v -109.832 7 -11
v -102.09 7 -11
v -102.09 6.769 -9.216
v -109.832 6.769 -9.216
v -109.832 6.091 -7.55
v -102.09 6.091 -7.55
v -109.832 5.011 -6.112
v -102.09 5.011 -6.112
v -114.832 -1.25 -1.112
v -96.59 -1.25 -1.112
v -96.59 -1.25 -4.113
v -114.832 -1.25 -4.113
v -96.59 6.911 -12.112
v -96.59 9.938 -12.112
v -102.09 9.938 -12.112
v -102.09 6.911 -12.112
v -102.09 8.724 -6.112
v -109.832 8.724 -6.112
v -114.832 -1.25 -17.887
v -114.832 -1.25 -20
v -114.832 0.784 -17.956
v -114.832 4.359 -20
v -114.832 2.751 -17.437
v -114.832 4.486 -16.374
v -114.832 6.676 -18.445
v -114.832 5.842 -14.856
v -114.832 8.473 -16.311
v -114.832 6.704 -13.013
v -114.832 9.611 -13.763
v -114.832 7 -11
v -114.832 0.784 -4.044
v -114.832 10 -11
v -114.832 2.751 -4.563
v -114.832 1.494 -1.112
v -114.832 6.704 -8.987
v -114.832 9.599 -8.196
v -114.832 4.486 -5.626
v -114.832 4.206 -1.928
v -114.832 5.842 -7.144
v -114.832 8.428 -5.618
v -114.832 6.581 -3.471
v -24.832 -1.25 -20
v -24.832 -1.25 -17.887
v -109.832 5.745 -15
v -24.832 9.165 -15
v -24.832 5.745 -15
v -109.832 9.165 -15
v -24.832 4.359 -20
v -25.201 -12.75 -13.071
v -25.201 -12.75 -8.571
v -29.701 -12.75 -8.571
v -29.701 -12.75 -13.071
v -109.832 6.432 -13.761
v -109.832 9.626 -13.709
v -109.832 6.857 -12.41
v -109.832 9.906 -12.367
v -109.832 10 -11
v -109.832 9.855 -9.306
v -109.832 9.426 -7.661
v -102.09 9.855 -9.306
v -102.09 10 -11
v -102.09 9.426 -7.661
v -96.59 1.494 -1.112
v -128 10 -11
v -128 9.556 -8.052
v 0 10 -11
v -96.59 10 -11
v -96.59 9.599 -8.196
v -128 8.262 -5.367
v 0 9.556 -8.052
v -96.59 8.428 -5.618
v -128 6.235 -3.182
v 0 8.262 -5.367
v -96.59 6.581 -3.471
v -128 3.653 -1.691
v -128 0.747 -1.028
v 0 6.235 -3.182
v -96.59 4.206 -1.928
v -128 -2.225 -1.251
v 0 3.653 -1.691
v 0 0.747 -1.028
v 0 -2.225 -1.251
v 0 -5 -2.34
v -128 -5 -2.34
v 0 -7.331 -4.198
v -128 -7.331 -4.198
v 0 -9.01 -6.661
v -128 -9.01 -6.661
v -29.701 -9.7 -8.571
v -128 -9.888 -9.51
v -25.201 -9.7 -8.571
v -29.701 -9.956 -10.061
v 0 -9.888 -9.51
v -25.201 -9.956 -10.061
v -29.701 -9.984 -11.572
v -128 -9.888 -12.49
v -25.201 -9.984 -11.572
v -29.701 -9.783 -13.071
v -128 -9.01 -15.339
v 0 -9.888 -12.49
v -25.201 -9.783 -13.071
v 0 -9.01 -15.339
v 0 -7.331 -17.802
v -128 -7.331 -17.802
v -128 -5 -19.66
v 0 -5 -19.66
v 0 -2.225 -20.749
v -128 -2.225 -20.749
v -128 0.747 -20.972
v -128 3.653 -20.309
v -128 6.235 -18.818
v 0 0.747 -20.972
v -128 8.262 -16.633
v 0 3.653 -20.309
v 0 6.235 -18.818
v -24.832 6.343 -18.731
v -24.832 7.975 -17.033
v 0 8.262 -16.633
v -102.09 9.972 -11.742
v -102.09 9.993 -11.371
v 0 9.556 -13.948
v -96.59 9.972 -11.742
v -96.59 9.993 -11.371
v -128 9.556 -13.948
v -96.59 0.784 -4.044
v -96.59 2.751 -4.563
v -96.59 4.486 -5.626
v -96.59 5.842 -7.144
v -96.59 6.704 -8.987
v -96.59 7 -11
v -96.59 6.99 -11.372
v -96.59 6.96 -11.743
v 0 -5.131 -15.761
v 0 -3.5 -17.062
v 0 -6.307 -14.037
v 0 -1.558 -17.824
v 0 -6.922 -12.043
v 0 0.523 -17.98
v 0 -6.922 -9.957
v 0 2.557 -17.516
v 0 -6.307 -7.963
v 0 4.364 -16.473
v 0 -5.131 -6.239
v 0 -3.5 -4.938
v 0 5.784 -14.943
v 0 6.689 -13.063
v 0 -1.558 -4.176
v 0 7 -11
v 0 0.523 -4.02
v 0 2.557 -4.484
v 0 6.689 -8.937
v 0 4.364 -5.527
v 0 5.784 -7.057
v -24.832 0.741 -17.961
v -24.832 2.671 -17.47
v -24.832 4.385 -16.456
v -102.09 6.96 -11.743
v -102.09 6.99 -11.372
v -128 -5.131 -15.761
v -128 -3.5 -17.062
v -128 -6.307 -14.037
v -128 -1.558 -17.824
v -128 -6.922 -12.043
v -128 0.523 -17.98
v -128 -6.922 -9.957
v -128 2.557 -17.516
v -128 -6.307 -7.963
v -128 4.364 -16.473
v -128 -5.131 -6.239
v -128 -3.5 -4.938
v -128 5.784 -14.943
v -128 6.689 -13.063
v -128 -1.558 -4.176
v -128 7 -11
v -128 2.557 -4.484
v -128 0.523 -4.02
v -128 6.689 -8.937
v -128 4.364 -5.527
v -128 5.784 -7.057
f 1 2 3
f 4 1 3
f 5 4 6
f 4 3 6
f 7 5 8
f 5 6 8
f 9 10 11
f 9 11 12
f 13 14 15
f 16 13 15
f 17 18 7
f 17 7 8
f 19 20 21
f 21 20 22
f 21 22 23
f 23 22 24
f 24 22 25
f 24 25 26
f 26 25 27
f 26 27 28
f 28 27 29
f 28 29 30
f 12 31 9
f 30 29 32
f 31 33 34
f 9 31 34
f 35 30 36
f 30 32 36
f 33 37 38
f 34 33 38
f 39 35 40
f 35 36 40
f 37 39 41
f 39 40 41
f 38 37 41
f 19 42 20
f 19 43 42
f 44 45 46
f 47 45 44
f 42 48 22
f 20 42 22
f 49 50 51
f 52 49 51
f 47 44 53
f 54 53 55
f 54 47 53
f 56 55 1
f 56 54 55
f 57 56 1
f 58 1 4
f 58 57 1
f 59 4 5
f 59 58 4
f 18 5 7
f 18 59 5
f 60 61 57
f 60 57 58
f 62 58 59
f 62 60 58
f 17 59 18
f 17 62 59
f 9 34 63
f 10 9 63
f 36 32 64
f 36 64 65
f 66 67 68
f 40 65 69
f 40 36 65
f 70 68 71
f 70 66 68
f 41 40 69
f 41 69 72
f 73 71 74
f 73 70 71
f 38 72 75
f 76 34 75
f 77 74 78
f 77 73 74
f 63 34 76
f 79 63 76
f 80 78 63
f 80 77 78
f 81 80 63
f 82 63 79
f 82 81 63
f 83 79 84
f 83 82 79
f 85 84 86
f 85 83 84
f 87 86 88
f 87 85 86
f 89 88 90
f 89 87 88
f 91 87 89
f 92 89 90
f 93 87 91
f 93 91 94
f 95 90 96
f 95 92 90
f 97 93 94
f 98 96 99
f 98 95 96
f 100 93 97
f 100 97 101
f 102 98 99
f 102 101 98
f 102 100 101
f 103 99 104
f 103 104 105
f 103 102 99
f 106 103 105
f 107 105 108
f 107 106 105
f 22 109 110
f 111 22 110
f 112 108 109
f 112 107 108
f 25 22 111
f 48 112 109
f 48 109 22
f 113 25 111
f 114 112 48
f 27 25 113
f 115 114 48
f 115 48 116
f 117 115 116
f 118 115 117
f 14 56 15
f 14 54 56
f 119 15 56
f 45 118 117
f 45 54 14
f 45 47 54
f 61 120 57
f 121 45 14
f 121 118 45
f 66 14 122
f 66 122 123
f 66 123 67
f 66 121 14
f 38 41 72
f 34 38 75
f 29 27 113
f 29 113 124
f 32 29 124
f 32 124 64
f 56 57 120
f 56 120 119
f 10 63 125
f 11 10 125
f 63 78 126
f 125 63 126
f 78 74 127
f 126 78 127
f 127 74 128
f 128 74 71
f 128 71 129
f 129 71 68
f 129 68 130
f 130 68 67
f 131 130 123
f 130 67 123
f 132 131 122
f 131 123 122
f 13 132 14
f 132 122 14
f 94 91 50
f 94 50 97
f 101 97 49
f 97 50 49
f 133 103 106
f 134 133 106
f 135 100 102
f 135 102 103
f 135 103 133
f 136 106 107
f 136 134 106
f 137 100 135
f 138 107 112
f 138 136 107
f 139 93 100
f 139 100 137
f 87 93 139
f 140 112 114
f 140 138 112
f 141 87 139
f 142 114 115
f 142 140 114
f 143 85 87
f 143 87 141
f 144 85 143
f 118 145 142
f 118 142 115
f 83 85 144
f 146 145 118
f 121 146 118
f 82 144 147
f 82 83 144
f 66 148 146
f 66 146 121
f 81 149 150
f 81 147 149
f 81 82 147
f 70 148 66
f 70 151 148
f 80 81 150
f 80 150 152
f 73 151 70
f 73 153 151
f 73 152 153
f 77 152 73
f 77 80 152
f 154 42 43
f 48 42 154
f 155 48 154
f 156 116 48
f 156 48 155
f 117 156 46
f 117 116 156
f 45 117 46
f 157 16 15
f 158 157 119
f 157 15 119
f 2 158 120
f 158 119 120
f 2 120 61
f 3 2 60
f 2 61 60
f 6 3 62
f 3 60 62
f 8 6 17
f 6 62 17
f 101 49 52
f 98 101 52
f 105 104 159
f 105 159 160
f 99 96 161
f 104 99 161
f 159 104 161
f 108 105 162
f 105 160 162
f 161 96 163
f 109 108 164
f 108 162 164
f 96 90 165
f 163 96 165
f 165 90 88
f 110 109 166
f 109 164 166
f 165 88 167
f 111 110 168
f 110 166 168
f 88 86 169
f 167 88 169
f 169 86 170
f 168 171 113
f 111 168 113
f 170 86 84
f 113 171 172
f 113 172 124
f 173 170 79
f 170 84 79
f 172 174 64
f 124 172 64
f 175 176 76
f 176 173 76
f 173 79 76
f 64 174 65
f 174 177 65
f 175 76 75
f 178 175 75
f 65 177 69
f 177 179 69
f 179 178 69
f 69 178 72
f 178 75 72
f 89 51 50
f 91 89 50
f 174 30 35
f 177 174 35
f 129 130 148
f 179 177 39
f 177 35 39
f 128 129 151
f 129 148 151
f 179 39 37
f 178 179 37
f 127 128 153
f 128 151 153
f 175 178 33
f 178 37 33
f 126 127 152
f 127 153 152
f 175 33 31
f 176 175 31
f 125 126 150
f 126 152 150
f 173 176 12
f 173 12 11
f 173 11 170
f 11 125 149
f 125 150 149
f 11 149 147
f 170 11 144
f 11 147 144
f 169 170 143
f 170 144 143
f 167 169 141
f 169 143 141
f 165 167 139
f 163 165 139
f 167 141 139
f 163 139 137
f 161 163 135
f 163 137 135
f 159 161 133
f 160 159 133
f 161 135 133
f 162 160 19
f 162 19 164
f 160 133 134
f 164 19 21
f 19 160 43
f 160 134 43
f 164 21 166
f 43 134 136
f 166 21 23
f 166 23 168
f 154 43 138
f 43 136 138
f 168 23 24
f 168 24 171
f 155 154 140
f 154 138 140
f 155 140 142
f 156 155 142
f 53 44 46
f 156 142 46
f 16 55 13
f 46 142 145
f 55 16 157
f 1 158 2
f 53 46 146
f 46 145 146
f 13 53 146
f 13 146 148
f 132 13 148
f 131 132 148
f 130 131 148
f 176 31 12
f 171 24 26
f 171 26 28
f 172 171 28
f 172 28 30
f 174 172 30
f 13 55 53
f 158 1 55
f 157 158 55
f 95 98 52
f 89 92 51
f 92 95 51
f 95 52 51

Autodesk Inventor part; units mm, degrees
ref_plane "YZ Plane" through (0, 0, 0) normal (1, 0, 0) x (0, 1, 0)
ref_plane "XY Plane" through (0, 0, 0) normal (0, 0, 1) x (1, 0, 0)
sketch "Schizzo2" plane through (0, 0, 0) normal (1, 0, 0) x (0, 1, 0)
  circle A0 centre (0, -11) radius 10
  point P0 (0, 0)
  dimension "d4" = 11
  dimension "d5" = 20
extrude "Estrusione1" add sketch "Schizzo2" against normal blind 128
shell "Svuotamento1" thickness 3 removed faces 2 at (0, -3.2365, -10.2023) at (-128, -3.2365, -10.2023)
sketch "Schizzo1" plane through (0, 0, 0) normal (0, 1, 0) x (-1, 0, 0)
  line L0 (0, 0) -> (0, -20)
  line L1 (0, -10) -> (128, -10)
  line L2 (128, 0) -> (128, -20)
  line L3 (0, -20) -> (25, -20)
  line L4 (25, -20) -> (128, -20)
  line L5 (128, 0) -> (0, 0)
  dimension "d0" = 20
  dimension "d3" = 25
ref_plane "Piano di lavoro7" through (0, 10, -11) normal (0, 1, 0) x (-1, 0, 0)
sketch "Schizzo13" plane through (0, 10, -11) normal (0, 1, 0) x (-1, 0, 0)
  line L0 (24.8317, -9) -> (114.8317, -9)
  line L1 (24.8317, -9) -> (24.8317, -4)
  line L2 (24.8317, -4) -> (109.8317, -4)
  line L3 (114.8317, -9) -> (114.8317, 9.8878)
  line L4 (0, 7) -> (128, 7) projected
  line L5 (109.8317, -4) -> (109.8317, 4.8878)
  line L6 (114.8317, 9.8878) -> (96.5899, 9.8878)
  line L7 (96.5899, 9.8878) -> (96.5899, -1.1122)
  line L8 (96.5899, -1.1122) -> (102.0899, -1.1122)
  line L9 (102.0899, -1.1122) -> (102.0899, 4.8878)
  line L10 (109.8317, 4.8878) -> (102.0899, 4.8878)
  point P0 (0, 11)
  dimension "d59" = 90
  dimension "d60" = 5
  dimension "d61" = 85
  dimension "d62" = 6
  dimension "d63" = 5
  dimension "d64" = 5.5
  dimension "d65" = 11
extrude "Estrusione7" cut sketch "Schizzo13" against normal blind 11.25
ref_plane "Piano di lavoro8" through (0, -10, -11) normal (0, 1, 0) x (-1, 0, 0)
sketch "Schizzo14" plane through (0, -10, -11) normal (0, 1, 0) x (-1, 0, 0)
  line L0 (25.2013, -2.0707) -> (29.7013, -2.0707)
  line L1 (29.7013, -2.0707) -> (29.7013, 2.4293)
  line L2 (29.7013, 2.4293) -> (25.2013, 2.4293)
  line L3 (25.2013, 2.4293) -> (25.2013, -2.0707)
  point P0 (0, 11)
  dimension "d68" = 4.5
  dimension "d69" = 4.5
extrude "Estrusione8" add sketch "Schizzo14" along normal blind 2.5 and the other way blind 2.75
properties part number "astaoscilla2_(310)"
